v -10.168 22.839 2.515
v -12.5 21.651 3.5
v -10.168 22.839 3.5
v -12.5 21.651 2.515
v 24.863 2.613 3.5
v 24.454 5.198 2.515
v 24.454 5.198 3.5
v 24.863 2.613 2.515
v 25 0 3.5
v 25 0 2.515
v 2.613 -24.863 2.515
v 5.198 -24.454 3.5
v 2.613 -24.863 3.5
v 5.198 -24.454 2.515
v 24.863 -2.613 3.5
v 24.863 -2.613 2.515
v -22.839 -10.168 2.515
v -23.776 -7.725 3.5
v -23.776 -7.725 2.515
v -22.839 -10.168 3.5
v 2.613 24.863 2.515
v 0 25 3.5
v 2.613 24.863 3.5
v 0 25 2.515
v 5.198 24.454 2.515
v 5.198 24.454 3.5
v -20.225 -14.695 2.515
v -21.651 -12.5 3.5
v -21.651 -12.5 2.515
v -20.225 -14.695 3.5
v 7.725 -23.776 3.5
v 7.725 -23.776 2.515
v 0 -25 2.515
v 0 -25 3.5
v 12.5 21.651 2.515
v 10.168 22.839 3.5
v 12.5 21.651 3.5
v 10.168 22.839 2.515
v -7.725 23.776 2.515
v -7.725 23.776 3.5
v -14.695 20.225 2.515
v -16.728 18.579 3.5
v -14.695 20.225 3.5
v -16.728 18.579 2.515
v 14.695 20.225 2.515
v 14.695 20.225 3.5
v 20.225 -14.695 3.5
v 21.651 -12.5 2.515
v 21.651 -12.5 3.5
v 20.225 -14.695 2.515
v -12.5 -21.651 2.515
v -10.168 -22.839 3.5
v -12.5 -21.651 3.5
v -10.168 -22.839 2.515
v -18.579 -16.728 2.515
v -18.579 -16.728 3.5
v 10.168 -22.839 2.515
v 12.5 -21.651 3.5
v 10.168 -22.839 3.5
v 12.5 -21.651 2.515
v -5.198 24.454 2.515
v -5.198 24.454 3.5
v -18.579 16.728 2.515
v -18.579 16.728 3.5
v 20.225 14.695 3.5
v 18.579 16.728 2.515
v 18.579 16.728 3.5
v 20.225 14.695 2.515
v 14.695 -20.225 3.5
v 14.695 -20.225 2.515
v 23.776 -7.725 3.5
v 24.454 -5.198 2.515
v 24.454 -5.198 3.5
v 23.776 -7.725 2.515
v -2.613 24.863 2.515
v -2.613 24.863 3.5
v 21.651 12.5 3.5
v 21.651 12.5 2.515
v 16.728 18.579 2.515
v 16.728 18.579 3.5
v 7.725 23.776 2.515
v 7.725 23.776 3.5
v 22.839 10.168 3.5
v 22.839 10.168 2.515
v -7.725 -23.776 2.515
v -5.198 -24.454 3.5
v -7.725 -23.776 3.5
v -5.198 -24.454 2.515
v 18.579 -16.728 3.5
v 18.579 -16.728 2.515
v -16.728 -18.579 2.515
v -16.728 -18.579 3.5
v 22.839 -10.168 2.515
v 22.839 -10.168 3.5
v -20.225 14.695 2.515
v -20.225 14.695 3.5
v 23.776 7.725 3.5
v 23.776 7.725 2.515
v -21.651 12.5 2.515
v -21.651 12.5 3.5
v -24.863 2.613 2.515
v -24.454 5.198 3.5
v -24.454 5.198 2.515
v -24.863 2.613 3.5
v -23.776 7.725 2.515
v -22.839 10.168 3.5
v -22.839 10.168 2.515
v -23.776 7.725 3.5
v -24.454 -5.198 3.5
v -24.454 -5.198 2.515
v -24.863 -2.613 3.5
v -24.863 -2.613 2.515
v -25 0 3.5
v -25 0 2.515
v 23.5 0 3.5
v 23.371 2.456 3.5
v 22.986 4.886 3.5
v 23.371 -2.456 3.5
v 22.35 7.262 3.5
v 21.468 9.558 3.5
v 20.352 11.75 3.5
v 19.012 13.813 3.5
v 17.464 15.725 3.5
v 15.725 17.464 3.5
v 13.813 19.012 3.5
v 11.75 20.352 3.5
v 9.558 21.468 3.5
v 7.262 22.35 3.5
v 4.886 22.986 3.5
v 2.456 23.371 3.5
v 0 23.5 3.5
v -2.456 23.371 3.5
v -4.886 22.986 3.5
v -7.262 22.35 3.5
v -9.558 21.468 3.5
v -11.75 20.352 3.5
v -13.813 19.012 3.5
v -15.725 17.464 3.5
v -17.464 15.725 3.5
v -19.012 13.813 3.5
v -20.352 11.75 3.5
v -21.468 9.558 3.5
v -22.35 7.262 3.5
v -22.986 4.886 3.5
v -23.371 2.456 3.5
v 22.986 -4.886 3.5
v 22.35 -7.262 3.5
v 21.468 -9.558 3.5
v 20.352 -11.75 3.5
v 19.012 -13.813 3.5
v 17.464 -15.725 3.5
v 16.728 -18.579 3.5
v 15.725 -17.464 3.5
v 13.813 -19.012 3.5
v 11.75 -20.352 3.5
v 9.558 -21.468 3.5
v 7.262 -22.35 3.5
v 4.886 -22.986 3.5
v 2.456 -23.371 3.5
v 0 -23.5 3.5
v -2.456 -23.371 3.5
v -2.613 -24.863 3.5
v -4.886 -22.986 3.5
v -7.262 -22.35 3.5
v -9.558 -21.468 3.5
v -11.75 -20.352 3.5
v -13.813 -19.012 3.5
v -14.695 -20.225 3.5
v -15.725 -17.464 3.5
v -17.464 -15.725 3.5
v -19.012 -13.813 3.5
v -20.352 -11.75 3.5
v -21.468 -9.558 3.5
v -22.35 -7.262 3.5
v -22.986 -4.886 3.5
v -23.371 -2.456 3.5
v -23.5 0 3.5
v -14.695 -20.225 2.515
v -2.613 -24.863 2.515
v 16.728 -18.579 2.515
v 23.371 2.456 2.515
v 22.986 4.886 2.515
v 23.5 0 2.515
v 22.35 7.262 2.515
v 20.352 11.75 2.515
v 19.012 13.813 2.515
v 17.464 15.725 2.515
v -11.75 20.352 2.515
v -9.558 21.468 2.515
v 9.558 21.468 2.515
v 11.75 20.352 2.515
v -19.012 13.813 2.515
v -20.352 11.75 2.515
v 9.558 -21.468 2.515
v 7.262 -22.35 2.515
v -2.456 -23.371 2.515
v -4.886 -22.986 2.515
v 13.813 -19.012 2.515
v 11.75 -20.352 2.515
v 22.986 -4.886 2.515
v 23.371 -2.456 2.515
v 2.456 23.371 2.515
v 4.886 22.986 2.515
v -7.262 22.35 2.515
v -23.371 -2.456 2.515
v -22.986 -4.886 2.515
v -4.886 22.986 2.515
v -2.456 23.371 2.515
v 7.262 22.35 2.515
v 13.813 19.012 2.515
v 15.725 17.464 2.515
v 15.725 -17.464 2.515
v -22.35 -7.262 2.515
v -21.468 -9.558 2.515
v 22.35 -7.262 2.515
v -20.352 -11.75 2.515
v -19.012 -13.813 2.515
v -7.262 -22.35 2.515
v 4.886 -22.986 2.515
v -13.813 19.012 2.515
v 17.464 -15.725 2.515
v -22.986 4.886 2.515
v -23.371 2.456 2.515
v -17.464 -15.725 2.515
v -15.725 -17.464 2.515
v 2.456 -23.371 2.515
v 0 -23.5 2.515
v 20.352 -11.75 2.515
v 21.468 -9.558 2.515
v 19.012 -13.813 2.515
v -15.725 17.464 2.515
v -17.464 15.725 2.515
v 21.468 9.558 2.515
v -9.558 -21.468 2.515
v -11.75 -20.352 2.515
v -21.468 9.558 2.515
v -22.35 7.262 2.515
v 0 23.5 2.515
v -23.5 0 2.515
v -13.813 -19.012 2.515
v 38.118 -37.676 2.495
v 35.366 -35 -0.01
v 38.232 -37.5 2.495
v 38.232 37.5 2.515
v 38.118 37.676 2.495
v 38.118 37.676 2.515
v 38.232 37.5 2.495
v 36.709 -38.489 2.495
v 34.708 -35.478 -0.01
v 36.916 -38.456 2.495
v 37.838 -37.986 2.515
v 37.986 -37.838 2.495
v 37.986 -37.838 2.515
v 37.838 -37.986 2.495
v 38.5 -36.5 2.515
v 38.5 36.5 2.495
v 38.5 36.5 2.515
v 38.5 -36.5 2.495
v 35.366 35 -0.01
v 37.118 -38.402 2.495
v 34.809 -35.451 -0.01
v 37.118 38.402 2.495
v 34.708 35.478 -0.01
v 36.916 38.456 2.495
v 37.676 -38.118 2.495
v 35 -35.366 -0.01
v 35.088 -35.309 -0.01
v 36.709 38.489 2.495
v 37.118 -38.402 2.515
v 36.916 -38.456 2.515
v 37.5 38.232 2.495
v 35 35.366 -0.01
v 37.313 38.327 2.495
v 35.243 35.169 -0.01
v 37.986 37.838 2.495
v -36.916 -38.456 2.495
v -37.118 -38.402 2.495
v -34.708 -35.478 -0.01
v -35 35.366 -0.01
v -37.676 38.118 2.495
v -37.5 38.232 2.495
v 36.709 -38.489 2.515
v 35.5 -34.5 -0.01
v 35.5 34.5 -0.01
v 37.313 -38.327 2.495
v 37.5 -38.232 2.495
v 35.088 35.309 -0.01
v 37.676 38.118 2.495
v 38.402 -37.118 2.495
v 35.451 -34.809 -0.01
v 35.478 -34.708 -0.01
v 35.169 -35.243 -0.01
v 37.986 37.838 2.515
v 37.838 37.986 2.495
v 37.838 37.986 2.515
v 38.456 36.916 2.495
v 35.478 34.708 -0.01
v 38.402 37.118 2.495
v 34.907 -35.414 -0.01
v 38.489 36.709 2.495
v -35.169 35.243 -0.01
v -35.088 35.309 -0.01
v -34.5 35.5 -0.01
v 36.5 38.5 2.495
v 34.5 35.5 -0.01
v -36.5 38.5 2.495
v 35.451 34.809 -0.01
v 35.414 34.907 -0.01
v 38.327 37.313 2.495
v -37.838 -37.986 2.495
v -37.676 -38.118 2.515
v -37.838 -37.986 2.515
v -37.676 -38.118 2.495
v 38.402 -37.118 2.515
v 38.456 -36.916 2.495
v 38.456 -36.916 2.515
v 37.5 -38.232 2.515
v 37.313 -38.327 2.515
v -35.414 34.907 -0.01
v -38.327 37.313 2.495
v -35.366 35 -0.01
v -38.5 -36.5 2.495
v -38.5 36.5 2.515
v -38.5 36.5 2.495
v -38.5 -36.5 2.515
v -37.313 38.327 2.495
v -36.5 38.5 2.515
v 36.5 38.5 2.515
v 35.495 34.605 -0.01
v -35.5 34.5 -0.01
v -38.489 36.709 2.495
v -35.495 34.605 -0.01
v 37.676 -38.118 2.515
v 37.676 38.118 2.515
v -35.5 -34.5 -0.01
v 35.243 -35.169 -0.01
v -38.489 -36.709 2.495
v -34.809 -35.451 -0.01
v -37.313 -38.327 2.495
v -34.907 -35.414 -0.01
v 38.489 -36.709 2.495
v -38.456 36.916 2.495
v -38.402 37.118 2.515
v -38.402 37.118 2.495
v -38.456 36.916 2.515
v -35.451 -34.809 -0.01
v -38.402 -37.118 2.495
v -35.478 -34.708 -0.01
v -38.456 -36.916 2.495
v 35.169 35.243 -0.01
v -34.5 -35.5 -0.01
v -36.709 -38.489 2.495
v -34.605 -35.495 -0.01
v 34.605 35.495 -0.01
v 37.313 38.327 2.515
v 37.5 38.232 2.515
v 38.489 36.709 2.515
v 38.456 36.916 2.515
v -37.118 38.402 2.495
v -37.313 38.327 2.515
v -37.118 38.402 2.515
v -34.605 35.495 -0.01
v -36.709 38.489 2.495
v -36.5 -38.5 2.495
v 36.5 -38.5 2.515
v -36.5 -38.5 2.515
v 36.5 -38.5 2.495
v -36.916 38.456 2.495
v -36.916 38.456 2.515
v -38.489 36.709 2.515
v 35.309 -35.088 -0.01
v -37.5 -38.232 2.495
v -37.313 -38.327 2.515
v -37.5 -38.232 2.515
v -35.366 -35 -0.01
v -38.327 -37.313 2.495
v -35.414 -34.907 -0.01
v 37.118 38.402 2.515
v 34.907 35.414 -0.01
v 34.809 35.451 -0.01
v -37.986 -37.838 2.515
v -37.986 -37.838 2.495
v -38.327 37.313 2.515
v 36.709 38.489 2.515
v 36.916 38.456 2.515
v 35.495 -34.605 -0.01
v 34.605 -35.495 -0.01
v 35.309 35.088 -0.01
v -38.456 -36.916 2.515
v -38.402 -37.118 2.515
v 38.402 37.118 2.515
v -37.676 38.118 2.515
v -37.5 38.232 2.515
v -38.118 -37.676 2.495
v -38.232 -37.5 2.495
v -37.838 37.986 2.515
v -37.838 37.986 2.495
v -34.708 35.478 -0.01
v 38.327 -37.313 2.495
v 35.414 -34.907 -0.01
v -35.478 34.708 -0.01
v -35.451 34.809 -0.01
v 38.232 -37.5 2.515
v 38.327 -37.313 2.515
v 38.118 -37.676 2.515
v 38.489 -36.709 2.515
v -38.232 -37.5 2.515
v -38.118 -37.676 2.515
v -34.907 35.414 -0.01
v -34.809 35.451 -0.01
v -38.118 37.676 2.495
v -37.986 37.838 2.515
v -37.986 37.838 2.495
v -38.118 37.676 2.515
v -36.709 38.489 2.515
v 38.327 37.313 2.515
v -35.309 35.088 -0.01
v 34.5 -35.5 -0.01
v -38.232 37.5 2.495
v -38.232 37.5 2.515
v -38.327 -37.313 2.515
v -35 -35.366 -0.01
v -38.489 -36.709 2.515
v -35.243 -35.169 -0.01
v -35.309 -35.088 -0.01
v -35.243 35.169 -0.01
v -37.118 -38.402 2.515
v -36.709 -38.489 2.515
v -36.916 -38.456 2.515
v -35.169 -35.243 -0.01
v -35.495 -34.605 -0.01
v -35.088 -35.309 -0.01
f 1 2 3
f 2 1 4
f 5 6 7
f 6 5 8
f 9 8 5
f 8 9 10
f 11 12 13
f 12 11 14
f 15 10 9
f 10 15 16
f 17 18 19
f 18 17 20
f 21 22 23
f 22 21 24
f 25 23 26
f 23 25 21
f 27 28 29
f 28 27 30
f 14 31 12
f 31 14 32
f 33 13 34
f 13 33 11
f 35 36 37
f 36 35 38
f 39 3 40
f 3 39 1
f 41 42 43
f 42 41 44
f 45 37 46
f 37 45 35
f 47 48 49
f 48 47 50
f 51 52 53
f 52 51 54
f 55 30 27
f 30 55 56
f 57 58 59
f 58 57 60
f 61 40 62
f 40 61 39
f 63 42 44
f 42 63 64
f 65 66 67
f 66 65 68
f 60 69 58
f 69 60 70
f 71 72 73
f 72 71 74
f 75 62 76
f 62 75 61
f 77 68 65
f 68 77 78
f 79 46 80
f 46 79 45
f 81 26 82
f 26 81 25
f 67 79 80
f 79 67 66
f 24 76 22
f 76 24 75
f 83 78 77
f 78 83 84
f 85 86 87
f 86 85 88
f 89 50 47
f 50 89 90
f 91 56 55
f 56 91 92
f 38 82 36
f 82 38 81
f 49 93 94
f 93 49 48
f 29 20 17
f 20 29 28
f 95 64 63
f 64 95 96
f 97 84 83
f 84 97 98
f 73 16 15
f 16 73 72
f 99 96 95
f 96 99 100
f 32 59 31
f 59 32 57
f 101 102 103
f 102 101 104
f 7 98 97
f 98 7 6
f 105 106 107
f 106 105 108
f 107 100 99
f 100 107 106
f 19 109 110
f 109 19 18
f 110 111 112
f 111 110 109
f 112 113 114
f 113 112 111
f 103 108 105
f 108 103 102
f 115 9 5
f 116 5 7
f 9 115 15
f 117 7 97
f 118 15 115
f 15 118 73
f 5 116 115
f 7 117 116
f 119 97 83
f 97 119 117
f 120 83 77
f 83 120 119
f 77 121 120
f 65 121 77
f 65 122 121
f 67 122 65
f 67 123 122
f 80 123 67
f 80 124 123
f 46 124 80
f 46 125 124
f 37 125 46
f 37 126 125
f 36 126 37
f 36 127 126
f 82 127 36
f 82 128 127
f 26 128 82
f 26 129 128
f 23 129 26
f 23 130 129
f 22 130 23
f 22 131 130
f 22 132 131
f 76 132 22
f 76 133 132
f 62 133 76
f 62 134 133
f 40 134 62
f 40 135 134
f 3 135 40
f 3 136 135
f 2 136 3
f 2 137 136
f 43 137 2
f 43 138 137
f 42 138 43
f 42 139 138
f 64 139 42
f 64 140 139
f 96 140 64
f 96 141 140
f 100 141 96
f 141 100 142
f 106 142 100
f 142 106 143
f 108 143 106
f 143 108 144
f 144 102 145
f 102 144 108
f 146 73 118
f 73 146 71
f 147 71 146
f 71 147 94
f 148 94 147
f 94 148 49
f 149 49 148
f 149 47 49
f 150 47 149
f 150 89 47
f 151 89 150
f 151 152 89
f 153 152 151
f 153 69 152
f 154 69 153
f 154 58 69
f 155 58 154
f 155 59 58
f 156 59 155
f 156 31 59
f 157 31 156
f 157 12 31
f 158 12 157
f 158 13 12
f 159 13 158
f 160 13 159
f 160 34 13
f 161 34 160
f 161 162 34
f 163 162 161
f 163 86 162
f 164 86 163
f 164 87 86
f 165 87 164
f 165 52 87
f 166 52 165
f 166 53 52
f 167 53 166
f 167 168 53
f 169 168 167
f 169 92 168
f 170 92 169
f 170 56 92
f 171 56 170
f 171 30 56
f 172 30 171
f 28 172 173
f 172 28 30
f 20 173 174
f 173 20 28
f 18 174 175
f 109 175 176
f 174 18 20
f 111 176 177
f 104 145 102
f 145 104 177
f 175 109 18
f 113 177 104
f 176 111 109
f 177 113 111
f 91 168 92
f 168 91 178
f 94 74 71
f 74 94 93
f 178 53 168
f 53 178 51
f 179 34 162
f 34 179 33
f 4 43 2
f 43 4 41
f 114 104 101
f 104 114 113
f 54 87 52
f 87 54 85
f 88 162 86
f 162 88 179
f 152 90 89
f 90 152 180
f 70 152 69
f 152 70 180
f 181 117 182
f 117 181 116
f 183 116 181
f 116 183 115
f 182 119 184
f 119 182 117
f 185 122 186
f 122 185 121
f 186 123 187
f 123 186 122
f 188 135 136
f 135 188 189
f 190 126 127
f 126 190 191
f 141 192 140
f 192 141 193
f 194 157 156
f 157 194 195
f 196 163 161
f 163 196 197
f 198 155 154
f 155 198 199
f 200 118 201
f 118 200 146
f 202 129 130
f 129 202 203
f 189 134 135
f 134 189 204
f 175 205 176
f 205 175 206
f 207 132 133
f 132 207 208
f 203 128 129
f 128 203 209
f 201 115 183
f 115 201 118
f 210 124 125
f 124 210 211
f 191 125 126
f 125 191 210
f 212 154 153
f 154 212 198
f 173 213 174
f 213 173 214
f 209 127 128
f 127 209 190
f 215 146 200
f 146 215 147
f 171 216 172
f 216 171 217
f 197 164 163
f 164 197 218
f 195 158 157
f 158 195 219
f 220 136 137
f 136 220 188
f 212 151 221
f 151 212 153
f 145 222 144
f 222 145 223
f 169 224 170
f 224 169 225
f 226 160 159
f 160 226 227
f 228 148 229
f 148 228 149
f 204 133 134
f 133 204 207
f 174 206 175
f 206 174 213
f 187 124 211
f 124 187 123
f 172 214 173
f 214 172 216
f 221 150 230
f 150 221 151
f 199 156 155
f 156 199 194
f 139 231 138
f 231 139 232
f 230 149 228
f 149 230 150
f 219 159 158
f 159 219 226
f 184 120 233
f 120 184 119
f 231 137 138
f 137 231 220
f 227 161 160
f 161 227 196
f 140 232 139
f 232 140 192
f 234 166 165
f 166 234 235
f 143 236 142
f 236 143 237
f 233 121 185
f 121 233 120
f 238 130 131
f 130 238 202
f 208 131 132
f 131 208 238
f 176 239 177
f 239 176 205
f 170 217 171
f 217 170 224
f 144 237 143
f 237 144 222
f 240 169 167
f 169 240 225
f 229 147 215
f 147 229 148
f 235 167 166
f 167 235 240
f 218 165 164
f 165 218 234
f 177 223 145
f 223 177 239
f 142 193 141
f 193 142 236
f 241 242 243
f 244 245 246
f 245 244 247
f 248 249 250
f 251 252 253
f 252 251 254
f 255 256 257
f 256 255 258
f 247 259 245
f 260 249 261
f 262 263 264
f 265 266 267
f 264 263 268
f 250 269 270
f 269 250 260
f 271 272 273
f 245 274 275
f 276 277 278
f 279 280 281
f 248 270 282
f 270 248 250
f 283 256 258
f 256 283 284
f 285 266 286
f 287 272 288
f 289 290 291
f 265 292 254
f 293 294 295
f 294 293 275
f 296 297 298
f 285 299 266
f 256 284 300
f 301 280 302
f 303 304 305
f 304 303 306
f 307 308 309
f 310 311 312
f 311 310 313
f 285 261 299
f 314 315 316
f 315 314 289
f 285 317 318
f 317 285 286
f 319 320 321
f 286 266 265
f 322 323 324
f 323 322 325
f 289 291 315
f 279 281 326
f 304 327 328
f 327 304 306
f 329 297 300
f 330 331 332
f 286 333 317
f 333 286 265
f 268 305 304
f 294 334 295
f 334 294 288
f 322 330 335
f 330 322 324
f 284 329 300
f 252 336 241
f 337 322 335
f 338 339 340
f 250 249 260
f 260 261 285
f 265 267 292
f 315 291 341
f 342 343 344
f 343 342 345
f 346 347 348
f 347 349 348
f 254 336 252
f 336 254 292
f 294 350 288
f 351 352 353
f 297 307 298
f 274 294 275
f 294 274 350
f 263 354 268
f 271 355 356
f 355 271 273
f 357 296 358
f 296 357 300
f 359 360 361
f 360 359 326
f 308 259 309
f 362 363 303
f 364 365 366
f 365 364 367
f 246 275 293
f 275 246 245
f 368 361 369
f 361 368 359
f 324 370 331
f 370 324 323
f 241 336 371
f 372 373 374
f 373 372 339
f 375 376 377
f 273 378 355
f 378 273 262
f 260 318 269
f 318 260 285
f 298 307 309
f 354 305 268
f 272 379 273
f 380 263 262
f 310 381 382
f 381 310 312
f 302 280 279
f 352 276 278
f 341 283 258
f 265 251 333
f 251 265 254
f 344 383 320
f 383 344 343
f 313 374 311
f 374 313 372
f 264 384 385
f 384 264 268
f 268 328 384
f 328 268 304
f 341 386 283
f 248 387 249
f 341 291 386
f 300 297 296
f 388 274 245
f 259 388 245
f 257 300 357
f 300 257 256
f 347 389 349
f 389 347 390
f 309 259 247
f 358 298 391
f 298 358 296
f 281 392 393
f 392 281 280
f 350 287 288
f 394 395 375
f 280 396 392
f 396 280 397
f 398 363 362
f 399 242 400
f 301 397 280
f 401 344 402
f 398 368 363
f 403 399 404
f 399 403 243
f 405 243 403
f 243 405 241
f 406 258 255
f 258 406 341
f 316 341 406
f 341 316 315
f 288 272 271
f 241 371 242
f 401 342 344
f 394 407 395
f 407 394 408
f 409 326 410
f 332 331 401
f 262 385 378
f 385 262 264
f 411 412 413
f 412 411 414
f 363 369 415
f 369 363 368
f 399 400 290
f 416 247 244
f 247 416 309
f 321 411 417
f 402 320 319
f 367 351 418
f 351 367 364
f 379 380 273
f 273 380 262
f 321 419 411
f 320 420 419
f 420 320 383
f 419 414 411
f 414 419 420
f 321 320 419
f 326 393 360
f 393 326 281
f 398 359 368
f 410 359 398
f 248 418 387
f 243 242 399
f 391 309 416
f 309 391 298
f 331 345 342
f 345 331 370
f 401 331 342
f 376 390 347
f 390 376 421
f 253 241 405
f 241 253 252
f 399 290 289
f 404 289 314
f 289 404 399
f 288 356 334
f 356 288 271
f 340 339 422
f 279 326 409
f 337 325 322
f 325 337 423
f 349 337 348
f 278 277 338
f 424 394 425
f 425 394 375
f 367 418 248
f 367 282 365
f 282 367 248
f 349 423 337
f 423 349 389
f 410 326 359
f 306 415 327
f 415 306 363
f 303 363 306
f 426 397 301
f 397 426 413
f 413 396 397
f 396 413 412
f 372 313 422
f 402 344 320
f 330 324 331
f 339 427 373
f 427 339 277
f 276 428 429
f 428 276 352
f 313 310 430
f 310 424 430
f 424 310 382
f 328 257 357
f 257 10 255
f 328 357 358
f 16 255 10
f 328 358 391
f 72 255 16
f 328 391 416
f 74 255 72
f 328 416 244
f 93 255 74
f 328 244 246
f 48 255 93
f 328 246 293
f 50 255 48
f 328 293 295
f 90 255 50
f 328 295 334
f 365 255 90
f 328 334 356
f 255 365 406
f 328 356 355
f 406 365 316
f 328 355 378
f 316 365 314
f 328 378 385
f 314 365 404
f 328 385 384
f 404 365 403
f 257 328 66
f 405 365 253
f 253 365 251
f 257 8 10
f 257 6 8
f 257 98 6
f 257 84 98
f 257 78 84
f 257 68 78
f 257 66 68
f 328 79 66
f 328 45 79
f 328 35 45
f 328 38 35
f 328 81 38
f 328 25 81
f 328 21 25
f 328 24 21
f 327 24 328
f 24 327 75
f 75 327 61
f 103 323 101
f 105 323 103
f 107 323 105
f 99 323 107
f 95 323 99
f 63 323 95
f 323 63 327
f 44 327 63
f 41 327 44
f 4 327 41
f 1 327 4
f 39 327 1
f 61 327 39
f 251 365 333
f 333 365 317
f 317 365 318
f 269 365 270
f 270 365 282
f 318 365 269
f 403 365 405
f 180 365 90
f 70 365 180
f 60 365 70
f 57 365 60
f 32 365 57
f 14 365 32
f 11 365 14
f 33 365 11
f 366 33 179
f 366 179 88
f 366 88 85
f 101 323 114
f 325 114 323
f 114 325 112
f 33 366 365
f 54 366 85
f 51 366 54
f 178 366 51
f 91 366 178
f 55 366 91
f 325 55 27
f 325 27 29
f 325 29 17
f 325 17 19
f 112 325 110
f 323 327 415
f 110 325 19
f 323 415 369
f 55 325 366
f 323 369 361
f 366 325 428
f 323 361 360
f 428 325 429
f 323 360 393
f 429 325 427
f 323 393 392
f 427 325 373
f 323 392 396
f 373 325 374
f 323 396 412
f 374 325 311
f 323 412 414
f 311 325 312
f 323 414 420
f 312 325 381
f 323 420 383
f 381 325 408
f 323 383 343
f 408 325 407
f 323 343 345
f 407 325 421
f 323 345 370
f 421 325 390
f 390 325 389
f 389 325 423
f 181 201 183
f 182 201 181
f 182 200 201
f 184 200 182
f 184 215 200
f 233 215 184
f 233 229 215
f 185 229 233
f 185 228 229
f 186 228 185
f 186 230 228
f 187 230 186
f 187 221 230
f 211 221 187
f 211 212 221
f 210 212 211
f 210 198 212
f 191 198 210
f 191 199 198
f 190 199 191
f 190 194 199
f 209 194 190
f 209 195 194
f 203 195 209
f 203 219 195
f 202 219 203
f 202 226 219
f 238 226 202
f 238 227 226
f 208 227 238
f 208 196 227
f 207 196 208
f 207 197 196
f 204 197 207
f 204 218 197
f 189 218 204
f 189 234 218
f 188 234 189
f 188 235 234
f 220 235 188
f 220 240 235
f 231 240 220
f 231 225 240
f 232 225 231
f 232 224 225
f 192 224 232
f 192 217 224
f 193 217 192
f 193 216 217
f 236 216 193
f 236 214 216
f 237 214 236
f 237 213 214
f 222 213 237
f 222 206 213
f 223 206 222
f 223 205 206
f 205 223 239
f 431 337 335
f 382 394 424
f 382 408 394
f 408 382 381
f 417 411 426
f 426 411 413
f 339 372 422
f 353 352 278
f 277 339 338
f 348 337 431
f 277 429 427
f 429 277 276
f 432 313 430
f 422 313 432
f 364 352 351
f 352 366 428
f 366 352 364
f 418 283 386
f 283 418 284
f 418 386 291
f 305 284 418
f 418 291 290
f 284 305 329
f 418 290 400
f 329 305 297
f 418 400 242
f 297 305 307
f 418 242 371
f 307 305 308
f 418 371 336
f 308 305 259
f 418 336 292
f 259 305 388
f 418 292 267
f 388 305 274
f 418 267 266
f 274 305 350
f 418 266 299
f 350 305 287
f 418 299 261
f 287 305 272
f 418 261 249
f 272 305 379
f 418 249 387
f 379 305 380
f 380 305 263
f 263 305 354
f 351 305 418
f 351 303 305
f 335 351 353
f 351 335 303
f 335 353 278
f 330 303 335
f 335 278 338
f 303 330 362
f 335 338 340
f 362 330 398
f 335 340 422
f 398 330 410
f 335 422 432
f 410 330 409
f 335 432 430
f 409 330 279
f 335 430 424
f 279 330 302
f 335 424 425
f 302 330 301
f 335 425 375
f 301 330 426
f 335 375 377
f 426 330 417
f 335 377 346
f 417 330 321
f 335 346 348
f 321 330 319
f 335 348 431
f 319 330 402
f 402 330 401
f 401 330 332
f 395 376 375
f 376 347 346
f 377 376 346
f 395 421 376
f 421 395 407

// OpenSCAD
include <../../lib/relativity.scad/relativity.scad>

$fn=60;

hull() {
  translated(2.5*z) minkowski() {
    box([73, 73, 0.01], anchor=bottom);
    rod(r=2, h=0.01);
  }
  minkowski() {
    box([69, 69, 0.01]);
    rod(r=1, h=0.01);
  }
}

differed("cut", "not(cut)")
  rod(d=50, h=3.5, anchor=bottom)
  align(top)
  rod(d=47, h=1, anchor=top, $class="cut");
